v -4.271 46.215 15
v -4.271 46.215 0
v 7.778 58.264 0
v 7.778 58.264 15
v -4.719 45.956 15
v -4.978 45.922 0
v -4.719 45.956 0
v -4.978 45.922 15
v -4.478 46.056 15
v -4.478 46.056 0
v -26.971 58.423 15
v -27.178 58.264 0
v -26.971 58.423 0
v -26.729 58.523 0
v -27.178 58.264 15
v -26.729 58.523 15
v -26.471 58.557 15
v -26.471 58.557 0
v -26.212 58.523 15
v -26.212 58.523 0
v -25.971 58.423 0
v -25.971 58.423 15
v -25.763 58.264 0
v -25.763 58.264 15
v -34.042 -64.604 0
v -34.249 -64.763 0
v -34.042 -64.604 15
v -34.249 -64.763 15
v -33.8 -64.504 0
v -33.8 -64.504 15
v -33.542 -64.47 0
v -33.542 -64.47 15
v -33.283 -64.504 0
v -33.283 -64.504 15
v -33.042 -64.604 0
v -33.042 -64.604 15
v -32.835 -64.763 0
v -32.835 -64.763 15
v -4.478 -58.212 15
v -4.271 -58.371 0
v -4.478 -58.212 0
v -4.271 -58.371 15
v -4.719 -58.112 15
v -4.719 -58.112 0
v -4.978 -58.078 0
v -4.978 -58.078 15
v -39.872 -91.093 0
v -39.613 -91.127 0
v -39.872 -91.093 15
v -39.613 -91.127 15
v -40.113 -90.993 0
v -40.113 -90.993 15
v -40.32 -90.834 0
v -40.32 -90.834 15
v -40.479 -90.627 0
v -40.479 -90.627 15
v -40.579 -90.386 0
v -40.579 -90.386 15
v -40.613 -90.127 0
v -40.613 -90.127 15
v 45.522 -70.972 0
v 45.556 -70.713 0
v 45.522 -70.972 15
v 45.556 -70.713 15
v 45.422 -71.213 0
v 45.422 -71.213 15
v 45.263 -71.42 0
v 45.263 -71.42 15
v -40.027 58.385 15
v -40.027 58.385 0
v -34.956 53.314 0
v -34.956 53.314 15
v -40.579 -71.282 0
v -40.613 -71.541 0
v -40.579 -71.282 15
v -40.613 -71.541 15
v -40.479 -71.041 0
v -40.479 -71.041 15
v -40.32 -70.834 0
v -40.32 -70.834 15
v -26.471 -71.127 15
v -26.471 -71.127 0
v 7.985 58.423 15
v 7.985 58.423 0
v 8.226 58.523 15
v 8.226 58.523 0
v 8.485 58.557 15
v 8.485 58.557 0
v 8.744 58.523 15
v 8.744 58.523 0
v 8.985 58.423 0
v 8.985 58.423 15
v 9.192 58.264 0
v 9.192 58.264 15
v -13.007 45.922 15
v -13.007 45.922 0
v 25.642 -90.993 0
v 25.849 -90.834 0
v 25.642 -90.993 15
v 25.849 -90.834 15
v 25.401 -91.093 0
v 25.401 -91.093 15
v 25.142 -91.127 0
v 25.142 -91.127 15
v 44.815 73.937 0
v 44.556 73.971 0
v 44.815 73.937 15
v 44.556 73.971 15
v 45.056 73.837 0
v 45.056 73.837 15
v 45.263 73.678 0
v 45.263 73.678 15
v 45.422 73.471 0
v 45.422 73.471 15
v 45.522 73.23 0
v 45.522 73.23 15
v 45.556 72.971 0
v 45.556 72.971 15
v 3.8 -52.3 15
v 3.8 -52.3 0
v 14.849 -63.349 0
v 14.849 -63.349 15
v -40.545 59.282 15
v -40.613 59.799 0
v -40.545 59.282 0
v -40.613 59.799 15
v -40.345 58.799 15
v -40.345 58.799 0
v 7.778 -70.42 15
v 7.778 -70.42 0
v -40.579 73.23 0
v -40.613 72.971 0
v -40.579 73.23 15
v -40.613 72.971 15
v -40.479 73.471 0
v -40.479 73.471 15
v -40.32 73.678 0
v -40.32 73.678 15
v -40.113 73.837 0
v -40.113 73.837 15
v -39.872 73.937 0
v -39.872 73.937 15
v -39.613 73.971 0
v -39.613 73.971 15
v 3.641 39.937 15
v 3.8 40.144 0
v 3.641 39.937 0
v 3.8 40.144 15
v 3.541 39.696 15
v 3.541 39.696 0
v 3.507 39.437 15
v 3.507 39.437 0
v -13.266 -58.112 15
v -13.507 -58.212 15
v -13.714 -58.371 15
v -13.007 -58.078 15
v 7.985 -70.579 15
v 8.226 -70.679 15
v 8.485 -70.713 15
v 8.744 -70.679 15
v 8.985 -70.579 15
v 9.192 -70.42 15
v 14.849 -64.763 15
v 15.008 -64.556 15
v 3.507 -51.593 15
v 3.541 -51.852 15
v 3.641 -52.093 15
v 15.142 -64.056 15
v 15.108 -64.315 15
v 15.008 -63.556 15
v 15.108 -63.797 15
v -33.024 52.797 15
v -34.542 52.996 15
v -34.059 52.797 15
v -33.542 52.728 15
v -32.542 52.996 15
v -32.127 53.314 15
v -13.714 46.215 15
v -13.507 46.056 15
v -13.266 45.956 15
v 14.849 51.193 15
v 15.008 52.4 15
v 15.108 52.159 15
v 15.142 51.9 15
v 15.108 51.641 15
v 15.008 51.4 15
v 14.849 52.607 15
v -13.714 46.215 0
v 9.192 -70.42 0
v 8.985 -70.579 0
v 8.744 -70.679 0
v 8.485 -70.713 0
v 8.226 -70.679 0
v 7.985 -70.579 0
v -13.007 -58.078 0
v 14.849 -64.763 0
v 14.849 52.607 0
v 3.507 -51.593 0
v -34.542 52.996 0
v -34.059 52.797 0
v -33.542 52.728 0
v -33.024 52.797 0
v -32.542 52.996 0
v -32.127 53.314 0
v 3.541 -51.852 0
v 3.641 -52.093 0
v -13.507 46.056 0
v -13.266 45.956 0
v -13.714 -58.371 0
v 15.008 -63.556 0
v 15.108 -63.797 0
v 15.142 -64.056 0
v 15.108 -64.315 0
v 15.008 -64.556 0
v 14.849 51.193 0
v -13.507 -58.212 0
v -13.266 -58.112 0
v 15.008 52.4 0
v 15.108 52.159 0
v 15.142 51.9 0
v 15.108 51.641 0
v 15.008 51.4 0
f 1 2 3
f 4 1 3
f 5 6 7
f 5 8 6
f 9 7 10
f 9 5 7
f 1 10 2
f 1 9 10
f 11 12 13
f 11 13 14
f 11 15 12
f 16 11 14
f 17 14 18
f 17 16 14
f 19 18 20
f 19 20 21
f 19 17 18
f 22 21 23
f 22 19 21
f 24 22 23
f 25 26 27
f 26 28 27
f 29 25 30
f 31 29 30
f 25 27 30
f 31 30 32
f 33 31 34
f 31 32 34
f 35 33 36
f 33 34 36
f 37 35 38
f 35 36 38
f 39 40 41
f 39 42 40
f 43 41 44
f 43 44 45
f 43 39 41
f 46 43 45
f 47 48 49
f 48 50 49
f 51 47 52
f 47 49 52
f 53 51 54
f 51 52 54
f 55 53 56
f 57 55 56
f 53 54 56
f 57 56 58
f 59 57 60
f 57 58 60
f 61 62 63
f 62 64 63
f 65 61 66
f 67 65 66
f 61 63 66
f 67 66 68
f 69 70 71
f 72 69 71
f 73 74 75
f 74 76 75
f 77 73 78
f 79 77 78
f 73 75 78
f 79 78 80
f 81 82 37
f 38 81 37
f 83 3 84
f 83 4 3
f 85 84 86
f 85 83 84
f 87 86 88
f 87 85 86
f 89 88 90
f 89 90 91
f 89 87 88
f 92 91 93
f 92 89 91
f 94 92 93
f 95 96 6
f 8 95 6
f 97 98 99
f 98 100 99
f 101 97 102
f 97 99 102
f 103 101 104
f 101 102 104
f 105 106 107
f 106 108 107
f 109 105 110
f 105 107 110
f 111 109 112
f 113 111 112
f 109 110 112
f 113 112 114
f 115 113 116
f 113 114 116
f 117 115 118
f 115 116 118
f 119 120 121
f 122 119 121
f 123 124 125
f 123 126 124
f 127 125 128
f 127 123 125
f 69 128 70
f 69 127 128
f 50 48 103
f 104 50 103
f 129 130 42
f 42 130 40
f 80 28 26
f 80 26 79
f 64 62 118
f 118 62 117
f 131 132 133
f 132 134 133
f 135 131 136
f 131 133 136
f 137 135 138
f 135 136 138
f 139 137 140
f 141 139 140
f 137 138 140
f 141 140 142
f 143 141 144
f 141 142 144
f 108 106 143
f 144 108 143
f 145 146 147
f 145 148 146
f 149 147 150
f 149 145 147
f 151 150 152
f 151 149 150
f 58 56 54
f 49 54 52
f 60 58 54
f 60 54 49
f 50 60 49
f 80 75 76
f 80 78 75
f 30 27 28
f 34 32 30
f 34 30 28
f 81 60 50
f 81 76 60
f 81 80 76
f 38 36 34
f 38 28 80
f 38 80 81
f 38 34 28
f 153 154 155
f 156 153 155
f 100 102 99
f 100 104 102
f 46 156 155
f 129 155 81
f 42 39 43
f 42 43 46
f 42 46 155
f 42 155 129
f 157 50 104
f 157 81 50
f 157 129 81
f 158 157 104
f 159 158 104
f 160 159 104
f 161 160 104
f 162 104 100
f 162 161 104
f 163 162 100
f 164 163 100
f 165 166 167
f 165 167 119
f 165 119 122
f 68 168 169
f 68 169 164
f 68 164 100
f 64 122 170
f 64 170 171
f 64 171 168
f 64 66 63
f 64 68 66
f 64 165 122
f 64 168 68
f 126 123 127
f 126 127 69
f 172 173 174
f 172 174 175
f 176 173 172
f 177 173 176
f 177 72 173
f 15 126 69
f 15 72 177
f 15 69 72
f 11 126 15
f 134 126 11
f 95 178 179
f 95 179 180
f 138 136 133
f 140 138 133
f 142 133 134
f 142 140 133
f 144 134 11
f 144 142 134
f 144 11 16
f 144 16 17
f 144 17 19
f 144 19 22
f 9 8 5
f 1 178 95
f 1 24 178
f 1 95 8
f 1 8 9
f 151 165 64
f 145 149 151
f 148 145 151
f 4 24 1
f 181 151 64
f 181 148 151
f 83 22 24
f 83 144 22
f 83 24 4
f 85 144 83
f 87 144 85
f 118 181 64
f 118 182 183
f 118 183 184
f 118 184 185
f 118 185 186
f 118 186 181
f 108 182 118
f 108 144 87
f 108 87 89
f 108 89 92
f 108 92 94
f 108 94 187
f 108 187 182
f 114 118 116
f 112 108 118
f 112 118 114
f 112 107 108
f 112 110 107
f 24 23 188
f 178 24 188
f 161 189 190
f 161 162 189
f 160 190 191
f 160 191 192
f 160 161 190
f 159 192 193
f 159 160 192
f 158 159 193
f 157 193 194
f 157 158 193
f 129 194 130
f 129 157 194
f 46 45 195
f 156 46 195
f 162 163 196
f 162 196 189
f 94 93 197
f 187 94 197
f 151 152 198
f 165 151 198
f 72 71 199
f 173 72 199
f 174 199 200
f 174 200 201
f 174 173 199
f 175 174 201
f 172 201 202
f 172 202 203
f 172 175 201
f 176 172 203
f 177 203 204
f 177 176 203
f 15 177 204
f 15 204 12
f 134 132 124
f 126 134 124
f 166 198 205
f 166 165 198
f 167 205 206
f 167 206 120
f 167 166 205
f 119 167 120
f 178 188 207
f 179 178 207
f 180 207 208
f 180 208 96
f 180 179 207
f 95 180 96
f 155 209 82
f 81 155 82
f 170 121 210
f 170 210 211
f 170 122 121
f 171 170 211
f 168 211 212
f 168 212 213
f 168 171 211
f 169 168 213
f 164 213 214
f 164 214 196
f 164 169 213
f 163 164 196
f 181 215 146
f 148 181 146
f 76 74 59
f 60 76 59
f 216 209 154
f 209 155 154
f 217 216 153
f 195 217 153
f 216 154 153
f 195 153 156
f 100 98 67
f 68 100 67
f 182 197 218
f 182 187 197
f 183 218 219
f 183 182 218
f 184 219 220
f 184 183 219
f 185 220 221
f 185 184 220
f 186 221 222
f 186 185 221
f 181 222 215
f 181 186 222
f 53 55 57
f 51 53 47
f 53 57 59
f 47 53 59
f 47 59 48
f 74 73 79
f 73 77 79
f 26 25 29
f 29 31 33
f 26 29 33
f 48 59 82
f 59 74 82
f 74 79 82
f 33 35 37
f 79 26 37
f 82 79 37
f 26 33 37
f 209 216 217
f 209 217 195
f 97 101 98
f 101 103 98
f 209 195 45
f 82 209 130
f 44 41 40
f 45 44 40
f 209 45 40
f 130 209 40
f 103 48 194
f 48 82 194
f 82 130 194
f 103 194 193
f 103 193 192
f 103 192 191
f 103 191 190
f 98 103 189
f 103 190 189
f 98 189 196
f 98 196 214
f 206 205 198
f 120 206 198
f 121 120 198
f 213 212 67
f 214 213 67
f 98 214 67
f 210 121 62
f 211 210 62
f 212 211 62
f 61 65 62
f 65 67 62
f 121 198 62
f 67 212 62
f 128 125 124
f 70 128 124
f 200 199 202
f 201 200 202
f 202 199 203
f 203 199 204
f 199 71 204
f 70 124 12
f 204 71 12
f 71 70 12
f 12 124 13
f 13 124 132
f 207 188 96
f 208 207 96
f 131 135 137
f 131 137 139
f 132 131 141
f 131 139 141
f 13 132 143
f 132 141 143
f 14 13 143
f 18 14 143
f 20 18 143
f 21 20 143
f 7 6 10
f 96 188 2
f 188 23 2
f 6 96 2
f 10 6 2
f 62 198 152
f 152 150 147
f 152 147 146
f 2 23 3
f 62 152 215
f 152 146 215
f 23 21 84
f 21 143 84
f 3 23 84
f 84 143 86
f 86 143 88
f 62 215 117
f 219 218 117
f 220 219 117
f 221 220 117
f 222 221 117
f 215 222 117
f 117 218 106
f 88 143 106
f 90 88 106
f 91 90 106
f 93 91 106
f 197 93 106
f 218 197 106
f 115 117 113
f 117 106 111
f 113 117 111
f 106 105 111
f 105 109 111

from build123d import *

# Parameters (mm, degrees)
F1_DEPTH = 15
F2_R     = 2
F3_R     = 1
F4_R     = 1
F5_R     = 1


with BuildPart() as f1:
    # F0 (on Top) → F1 (new body)
    with BuildSketch(Plane.XY):
        Polygon((45.5563491861, 73.9710003696), (-40.6126983722, 73.9710003696), (-40.6126983722, 58.9710003696), (-33.5416305603, 51.8999325577), (-26.4705627485, 58.9710003696), (-13.4215728753, 45.9220104963), (-4.563708499, 45.9220104963), (8.4852813742, 58.9710003696), (15.5563491861, 51.8999325577), (3.5073593129, 39.8509426845), (3.5073593129, -52.0069216918), (15.5563491861, -64.055911565), (8.4852813742, -71.1269793769), (-4.563708499, -58.0779895037), (-13.4215728753, -58.0779895037), (-26.4705627485, -71.1269793769), (-33.5416305603, -64.055911565), (-40.6126983722, -71.1269793769), (-40.6126983722, -91.1269793769), (25.5563491861, -91.1269793769), (45.5563491861, -71.1269793769), align=None)
    extrude(amount=F1_DEPTH)

    # F2
    f2_edges = [f1.edges().sort_by_distance(p)[0] for p in [
        (-33.541631, 51.899933, 7.5),
        (-40.612698, 58.971, 7.5),
    ]]
    fillet(f2_edges, radius=F2_R)

    # F3
    f3_edges = [f1.edges().sort_by_distance(p)[0] for p in [
        (-26.470563, 58.971, 7.5),
        (-13.421573, 45.92201, 7.5),
        (-4.563708, 45.92201, 7.5),
        (8.485281, 58.971, 7.5),
        (-40.612698, 59.799427, 7.5),
    ]]
    fillet(f3_edges, radius=F3_R)

    # F4
    f4_edges = [f1.edges().sort_by_distance(p)[0] for p in [
        (-40.612698, -71.126979, 7.5),
        (-33.541631, -64.055912, 7.5),
        (-13.421573, -58.07799, 7.5),
        (-4.563708, -58.07799, 7.5),
        (15.556349, -64.055912, 7.5),
        (3.507359, -52.006922, 7.5),
        (3.507359, 39.850943, 7.5),
        (15.556349, 51.899933, 7.5),
    ]]
    fillet(f4_edges, radius=F4_R)

    # F5
    f5_edges = [f1.edges().sort_by_distance(p)[0] for p in [
        (-40.612698, 73.971, 7.5),
        (8.485281, -71.126979, 7.5),
        (-40.612698, -91.126979, 7.5),
        (45.556349, 73.971, 7.5),
        (45.556349, -71.126979, 7.5),
        (25.556349, -91.126979, 7.5),
    ]]
    fillet(f5_edges, radius=F5_R)


solid = f1.part
